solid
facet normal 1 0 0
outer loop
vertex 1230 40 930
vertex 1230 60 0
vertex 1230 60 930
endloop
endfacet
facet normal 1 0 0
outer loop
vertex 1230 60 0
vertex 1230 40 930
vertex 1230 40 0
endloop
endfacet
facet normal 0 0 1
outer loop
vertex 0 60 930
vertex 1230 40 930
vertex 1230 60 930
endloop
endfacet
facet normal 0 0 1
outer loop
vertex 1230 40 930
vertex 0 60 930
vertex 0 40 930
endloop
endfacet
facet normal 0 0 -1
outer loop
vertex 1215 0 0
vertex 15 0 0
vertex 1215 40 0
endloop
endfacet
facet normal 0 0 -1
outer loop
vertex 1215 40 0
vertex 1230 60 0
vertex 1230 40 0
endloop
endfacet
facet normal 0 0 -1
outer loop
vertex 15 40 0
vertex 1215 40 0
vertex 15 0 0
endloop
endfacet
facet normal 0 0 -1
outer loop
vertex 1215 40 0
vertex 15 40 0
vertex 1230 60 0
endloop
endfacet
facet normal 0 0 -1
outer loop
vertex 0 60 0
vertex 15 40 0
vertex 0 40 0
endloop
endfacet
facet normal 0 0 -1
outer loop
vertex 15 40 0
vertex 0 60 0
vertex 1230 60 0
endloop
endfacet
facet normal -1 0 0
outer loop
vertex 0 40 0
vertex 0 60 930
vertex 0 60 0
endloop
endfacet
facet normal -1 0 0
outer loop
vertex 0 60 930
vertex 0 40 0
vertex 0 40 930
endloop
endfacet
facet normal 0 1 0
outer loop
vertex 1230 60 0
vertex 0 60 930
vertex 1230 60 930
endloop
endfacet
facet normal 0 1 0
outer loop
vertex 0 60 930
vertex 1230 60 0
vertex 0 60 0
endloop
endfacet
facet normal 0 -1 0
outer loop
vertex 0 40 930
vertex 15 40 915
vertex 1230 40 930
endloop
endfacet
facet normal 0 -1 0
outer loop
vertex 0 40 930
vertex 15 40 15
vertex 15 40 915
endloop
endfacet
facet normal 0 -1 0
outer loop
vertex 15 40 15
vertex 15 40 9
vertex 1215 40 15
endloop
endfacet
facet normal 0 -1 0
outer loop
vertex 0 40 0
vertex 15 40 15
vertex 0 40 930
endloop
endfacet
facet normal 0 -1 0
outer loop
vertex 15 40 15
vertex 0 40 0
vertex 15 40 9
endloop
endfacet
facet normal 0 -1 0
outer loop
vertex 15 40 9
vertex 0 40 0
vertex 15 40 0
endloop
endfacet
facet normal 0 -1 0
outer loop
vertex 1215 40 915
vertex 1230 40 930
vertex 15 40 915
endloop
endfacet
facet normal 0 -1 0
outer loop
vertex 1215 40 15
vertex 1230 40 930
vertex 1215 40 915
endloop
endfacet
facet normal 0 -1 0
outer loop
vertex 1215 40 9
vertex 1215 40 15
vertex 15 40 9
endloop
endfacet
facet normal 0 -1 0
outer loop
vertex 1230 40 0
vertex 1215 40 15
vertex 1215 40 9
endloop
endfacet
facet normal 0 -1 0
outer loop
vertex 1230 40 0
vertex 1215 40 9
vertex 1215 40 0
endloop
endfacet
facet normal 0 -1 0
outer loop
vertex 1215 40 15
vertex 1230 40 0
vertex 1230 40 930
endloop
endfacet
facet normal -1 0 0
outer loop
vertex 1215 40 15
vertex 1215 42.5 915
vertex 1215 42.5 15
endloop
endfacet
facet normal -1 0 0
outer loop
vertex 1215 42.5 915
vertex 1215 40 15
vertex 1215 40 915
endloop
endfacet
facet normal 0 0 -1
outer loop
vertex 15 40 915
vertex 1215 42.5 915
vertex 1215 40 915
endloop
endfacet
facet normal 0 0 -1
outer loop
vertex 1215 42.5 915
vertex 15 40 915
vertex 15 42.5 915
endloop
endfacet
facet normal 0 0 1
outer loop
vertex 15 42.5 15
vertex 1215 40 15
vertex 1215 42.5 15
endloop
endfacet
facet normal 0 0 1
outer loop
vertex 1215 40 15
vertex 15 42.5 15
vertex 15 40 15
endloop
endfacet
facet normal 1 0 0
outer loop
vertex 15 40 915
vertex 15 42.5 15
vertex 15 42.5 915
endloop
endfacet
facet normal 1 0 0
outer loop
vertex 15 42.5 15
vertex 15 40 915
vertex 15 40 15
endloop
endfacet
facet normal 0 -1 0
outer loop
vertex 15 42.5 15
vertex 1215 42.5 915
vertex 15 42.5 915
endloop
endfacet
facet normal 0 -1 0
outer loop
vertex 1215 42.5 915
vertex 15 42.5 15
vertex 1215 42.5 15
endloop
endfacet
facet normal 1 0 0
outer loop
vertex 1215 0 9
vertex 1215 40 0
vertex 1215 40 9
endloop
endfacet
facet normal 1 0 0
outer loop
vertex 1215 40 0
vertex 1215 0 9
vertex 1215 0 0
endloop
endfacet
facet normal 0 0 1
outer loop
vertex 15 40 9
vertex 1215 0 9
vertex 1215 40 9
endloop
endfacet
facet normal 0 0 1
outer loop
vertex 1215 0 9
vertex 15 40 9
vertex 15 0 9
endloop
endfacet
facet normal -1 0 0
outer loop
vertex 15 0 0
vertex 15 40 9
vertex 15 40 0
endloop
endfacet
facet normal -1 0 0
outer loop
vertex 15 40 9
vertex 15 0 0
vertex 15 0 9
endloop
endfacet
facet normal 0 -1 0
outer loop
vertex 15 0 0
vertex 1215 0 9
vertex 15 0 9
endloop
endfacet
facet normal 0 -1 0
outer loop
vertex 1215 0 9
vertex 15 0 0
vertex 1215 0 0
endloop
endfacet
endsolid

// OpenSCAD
// A whiteboard, as a workshop model: a flat panel in a thin frame with a tray
// under its lower edge, hung on a wall. What a person draws on, and what the
// outline finder reads a photograph of (docs/pictures.md).
//
// The origin is the lower-left corner as a person facing it sees it, at the
// front of its tray; X runs along the wall, Y runs back to the wall it hangs
// on, Z runs up. Its back, the face it hangs by, is at its greatest Y: it hangs
// on a wall whose inner face looks toward -Y, and its writing surface looks the
// same way, toward a person in the room.
//
// The size is the panel's own writing surface, the part a photograph is
// squared to; the frame and the tray stand outside it.

// Customizer parameters
width = 1200;    // [300:50:3000] The writing surface's width (mm): what sizes a photograph squared to it
height = 900;    // [200:50:1500] The writing surface's height (mm)
frame = 15;      // [5:1:40] The frame's width round the surface (mm)
thickness = 20;  // [8:1:40] From the wall to the frame's face (mm)
tray = 60;       // [0:5:120] How far the tray stands out from the wall (mm); 0 draws none

/* [Hidden] */
eps = 0.5;   // how far a part sinks into what it stands on, so the union is one closed mesh

depth = max(thickness, tray);   // from the front of the tray to the wall

// the frame against the wall, with the surface set a little back in its front
color("#b8bcc2") difference() {
    translate([0, depth - thickness, 0]) cube([width + 2 * frame, thickness, height + 2 * frame]);
    translate([frame, depth - thickness - eps, frame]) cube([width, 4 + eps, height]);
}
// the writing surface
color("#f2f2ee") translate([frame, depth - thickness + 2 + eps, frame]) cube([width, 2, height]);
// the tray under the lower edge, the width of the surface, out into the room
if (tray > 0)
    color("#b8bcc2") translate([frame, depth - tray, 0]) cube([width, tray, frame * 0.6]);
